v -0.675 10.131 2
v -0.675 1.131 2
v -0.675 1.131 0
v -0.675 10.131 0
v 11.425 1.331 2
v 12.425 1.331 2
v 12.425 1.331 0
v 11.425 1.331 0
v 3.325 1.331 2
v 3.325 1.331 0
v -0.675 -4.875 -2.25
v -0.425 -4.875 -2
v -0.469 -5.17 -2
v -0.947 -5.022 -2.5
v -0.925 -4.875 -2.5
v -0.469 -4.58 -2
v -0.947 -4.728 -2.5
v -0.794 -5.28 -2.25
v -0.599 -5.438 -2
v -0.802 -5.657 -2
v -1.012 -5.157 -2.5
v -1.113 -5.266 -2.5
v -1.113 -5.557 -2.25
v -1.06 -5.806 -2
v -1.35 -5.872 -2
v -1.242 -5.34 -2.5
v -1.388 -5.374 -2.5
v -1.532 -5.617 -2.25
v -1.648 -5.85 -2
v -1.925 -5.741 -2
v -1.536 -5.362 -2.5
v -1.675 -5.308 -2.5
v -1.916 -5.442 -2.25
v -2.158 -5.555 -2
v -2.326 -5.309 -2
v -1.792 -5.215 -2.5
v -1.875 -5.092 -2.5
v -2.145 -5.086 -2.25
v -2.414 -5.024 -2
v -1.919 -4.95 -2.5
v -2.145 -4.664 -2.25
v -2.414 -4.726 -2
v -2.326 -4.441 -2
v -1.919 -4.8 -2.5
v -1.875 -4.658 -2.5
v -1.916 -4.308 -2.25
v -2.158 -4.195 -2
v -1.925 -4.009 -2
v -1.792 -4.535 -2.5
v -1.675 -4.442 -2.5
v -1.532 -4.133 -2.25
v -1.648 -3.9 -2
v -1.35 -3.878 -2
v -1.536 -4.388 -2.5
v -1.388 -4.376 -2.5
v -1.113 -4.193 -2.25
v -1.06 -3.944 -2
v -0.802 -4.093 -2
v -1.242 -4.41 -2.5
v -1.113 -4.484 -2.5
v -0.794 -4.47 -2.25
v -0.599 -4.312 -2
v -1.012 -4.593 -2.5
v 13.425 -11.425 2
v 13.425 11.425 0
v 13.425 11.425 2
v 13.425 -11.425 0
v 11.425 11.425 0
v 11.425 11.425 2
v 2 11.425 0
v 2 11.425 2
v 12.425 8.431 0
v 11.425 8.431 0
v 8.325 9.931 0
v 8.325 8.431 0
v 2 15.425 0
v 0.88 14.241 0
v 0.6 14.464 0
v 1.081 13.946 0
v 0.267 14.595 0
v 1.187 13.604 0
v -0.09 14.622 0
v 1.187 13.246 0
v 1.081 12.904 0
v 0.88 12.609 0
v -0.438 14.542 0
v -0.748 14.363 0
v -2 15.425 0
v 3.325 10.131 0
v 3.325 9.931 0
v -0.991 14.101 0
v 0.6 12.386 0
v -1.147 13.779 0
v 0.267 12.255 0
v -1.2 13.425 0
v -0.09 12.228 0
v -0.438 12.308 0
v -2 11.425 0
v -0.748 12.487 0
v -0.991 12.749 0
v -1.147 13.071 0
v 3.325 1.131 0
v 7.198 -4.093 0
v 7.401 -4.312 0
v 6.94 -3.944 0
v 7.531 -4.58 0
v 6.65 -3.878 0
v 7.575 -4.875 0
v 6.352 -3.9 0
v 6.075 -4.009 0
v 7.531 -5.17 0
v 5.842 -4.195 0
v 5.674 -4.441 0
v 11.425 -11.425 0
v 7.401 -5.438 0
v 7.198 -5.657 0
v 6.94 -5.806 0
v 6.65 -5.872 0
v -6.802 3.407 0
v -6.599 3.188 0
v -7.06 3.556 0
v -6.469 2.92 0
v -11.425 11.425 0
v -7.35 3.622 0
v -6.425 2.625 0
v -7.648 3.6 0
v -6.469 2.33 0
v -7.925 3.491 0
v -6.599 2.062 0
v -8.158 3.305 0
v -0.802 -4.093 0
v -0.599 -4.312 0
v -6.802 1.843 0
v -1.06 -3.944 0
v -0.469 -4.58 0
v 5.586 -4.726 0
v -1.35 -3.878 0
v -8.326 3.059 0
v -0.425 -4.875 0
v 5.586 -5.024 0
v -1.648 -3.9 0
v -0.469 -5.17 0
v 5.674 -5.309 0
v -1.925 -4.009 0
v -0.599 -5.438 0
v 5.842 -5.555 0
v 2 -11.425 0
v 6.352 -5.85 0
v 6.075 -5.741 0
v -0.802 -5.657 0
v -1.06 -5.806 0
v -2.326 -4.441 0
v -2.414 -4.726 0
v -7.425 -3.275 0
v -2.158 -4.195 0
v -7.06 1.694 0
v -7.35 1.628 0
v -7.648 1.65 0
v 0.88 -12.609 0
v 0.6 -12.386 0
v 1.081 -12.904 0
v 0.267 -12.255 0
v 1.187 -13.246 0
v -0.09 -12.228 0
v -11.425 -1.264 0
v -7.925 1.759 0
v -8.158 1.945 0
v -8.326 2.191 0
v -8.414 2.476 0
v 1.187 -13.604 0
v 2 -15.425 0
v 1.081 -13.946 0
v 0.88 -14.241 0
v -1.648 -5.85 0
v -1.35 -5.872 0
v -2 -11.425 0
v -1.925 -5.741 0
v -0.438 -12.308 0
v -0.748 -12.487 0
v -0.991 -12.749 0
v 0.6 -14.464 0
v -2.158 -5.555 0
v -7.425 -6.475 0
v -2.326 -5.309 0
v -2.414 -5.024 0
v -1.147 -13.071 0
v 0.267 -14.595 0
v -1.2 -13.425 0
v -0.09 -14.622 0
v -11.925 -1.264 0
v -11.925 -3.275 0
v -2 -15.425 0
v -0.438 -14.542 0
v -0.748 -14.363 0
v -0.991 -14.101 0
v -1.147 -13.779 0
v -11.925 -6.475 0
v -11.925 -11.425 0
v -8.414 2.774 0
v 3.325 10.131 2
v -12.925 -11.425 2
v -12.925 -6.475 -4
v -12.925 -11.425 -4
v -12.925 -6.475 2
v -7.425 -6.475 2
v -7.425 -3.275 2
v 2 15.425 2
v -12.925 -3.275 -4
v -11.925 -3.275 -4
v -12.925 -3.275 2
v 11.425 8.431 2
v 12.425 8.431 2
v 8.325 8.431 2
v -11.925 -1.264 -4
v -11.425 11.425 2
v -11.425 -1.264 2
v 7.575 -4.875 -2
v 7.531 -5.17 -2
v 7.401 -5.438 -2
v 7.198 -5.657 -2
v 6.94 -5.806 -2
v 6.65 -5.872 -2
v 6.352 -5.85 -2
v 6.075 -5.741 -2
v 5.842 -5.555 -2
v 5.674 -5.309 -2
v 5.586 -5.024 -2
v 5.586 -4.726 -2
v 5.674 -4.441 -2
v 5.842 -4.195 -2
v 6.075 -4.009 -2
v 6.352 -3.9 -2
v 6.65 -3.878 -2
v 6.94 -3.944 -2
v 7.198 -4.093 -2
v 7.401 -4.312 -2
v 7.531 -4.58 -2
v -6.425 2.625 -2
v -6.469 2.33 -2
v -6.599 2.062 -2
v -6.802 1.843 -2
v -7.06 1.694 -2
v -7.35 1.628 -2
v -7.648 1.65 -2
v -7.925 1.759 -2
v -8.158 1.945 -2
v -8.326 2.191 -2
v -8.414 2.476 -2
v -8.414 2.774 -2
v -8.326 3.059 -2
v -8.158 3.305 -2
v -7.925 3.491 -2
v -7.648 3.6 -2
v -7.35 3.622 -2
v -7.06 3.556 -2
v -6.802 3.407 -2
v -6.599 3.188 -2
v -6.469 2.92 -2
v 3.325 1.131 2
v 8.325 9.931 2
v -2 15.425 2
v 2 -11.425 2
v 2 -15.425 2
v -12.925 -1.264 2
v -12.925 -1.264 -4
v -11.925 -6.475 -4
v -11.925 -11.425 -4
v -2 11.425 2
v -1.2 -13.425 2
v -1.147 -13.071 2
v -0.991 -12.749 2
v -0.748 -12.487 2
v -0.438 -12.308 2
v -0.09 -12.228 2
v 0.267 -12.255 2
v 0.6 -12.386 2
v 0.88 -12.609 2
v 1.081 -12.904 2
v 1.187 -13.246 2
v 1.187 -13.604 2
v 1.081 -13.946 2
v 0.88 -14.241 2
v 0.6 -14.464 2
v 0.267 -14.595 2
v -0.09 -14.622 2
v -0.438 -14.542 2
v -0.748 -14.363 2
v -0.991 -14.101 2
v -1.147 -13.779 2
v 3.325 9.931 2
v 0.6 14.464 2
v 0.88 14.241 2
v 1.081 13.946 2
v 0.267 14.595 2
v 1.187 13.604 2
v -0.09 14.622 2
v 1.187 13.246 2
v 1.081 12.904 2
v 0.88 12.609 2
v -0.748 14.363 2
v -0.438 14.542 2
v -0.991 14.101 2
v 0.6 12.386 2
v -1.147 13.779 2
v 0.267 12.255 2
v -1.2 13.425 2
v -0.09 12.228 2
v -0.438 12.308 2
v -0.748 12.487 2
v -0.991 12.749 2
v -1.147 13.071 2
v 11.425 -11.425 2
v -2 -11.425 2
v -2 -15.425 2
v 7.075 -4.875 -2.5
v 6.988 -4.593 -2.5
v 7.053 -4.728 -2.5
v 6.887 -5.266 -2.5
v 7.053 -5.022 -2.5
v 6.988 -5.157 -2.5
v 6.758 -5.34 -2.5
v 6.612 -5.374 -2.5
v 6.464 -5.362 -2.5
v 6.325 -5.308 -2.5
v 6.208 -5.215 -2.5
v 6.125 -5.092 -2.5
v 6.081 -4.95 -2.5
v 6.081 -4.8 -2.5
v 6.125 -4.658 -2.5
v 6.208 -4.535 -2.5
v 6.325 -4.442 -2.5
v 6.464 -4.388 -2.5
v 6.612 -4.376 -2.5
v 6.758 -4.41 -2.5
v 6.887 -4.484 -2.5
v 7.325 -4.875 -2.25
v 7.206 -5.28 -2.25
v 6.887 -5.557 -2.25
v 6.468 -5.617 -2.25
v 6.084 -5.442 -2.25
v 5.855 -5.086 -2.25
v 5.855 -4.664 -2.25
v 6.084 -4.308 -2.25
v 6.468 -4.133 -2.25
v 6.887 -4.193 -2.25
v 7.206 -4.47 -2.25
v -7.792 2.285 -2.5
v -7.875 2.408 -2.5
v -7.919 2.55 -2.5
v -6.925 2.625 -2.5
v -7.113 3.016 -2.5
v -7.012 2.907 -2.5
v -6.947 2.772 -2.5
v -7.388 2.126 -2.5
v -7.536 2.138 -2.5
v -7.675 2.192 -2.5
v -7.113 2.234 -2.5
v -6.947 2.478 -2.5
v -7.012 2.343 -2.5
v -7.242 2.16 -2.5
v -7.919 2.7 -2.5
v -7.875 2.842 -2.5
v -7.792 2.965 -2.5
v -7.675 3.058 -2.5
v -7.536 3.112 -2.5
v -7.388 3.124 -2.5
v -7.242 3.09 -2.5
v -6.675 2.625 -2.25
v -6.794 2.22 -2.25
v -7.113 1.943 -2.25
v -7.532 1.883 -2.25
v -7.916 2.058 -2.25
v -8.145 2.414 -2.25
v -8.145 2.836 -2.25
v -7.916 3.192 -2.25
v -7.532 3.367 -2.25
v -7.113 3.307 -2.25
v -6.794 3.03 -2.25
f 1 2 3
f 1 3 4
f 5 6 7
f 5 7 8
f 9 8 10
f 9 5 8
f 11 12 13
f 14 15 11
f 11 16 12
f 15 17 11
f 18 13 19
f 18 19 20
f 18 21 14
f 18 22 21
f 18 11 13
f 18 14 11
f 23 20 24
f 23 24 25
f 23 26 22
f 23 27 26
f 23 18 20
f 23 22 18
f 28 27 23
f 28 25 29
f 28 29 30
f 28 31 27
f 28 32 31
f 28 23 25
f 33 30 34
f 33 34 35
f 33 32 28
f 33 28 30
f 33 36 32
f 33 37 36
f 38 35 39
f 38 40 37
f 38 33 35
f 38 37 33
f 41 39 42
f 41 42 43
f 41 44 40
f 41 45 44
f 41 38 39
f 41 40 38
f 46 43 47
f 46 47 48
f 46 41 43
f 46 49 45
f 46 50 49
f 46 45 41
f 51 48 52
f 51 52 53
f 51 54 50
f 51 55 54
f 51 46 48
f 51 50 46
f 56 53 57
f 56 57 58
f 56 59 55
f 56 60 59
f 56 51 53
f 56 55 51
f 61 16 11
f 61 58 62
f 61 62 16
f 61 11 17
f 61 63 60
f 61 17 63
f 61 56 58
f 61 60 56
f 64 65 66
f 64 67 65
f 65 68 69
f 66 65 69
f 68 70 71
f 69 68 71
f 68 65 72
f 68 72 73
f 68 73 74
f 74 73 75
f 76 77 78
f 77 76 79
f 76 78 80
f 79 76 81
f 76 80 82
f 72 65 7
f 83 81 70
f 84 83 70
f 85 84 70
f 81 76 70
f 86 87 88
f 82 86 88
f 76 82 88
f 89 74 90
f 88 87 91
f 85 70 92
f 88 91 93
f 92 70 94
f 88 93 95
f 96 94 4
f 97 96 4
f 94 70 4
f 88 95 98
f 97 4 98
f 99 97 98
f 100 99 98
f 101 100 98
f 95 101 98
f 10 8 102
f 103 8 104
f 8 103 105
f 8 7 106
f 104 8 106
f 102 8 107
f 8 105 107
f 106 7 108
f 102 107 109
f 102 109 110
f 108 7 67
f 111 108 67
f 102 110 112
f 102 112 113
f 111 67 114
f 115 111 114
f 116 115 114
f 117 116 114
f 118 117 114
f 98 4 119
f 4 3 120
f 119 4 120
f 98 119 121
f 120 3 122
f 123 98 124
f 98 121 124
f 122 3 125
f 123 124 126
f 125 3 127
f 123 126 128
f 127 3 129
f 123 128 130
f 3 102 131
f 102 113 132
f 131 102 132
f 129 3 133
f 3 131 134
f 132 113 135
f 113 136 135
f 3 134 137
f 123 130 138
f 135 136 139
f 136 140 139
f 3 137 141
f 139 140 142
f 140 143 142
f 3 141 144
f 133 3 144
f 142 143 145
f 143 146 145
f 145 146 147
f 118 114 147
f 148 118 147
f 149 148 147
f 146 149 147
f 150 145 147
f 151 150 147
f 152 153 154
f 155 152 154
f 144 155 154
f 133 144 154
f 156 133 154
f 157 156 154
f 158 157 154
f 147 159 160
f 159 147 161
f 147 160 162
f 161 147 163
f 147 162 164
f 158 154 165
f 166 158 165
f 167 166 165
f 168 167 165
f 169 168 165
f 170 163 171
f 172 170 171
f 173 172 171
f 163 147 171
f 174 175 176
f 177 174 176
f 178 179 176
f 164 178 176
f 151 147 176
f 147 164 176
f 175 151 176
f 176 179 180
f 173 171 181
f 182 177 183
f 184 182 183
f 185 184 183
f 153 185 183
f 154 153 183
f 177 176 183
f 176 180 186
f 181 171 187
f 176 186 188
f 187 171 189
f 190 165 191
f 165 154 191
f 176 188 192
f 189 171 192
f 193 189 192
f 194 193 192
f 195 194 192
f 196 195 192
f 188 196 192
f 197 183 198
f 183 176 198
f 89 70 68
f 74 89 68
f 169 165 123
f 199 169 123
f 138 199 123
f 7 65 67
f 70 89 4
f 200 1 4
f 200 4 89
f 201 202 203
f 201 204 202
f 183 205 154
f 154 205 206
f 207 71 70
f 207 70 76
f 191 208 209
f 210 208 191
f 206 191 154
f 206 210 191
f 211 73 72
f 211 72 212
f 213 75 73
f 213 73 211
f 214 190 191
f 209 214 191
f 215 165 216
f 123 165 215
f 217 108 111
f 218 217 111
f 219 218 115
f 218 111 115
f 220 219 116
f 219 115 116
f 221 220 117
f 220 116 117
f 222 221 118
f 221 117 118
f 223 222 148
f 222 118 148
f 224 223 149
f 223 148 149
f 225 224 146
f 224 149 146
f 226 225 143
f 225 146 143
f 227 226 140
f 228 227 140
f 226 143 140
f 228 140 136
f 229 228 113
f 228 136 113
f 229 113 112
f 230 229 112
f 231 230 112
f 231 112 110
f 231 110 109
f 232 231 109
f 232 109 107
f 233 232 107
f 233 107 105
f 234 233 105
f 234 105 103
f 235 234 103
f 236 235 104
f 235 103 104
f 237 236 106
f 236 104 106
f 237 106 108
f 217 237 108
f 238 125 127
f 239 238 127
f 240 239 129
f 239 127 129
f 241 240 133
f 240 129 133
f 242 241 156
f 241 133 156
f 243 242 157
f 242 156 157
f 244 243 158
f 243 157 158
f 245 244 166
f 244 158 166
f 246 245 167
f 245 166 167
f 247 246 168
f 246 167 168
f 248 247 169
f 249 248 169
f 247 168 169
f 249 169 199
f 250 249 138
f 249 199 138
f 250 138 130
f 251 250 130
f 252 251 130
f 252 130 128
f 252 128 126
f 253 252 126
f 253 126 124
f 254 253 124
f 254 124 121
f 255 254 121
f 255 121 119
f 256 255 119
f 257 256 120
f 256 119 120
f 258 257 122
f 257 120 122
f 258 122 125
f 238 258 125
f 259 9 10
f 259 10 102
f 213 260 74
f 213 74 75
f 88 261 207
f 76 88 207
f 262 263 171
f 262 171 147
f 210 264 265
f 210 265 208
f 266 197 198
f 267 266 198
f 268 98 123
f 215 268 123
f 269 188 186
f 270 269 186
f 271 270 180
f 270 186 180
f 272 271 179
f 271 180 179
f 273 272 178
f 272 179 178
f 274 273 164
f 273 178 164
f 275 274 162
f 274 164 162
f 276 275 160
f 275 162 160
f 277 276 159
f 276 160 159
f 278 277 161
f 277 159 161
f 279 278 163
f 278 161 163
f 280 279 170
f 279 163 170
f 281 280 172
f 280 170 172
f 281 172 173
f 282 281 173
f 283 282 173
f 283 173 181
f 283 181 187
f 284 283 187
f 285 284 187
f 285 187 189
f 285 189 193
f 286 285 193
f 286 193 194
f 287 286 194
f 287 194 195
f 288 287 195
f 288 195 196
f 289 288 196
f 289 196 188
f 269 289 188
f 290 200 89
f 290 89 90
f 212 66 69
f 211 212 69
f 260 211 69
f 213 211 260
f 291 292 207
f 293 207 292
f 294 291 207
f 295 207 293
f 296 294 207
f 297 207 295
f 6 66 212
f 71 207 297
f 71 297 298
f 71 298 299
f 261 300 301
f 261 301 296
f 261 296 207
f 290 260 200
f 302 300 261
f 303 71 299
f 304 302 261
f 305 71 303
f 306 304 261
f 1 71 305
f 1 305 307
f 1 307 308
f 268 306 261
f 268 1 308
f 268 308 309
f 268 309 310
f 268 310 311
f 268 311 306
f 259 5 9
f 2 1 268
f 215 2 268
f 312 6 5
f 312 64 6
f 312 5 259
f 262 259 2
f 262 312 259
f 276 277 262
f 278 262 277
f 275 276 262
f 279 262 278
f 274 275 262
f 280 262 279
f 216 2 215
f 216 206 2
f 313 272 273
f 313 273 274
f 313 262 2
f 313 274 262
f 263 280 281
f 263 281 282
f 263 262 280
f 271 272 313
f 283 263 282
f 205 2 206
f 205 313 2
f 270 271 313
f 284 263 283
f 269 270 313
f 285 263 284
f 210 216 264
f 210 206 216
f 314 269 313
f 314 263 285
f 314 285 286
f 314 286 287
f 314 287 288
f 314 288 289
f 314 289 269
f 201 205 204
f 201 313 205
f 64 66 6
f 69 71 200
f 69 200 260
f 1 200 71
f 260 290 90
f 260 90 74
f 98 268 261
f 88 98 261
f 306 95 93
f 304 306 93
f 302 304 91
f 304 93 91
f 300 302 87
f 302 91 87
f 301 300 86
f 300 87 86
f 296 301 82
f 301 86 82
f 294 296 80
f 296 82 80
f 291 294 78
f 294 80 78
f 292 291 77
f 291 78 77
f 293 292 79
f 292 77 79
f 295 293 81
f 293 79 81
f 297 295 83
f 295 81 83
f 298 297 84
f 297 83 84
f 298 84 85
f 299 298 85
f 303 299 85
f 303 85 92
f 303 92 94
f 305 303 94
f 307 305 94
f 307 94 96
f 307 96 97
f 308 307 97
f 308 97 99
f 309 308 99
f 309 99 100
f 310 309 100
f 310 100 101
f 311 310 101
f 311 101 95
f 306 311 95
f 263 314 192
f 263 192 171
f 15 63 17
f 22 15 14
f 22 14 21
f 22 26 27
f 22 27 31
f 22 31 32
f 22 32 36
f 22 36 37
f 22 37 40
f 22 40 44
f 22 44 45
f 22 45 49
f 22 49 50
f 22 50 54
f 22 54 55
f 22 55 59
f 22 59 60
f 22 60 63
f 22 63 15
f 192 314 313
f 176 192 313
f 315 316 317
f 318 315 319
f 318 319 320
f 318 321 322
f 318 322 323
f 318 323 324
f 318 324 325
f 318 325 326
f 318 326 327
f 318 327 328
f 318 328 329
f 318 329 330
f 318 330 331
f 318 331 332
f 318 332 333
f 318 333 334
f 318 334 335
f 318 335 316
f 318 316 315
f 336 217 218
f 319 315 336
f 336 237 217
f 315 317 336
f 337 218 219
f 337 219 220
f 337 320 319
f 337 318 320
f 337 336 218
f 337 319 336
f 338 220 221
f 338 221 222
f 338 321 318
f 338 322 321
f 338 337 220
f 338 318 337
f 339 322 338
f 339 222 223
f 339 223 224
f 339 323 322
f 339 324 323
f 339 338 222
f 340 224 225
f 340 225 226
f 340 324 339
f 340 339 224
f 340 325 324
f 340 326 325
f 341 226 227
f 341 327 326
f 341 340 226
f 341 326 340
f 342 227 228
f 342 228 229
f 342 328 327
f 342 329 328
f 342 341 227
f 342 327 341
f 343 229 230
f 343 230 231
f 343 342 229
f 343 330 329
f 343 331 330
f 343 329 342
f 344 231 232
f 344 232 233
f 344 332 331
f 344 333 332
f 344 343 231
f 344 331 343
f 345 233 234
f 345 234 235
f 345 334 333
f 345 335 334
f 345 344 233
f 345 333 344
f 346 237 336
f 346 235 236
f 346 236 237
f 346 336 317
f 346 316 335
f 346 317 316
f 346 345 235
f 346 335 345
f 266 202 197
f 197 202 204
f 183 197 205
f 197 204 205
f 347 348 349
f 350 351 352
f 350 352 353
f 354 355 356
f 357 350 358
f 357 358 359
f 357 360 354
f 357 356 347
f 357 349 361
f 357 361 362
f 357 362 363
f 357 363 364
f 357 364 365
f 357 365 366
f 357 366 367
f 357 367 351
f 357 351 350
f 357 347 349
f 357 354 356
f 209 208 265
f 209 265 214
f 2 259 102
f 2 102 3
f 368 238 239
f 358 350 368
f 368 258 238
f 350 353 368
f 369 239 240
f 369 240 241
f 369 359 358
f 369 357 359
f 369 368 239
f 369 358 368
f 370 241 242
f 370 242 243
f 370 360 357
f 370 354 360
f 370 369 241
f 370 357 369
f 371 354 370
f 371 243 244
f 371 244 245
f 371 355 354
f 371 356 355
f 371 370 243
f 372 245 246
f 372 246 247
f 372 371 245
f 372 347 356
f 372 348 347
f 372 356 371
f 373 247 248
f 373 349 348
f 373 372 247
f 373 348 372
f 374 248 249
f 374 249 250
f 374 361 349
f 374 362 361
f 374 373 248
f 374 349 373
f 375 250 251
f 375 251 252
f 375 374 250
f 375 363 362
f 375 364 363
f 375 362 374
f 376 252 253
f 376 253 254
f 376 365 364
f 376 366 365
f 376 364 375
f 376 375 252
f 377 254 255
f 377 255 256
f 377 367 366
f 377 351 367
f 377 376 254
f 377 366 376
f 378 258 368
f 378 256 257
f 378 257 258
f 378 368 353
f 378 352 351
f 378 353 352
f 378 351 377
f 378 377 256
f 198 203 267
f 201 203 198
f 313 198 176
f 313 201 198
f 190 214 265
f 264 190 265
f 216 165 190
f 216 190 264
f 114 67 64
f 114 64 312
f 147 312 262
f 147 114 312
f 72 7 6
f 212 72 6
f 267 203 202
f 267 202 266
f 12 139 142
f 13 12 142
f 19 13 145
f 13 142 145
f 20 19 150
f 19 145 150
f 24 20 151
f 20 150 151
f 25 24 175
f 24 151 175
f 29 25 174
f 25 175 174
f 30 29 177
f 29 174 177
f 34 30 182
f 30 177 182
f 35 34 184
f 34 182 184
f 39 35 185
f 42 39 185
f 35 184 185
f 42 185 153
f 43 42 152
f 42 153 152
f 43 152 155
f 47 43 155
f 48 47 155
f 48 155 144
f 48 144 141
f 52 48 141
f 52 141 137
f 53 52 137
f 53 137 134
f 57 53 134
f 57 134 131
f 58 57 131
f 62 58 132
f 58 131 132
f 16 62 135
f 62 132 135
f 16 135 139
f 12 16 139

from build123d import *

# Parameters (mm, degrees)
SKETCH2_W            = 22.85
SKETCH2_H            = 22.85
BOSS_EXTRUDE1_DEPTH  = 2
SKETCH3_W            = 4
SKETCH3_H            = 4
BOSS_EXTRUDE2_DEPTH  = 2
M2_CLEARANCE_HOLE1_D = 2.4
CUT_EXTRUDE3_REACH   = 21.299
CUT_EXTRUDE4_REACH   = 21.299
SKETCH8_W            = 4
SKETCH8_H            = 3.2
SKETCH10_W           = 4.95
SKETCH10_H           = 2
SKETCH10_W_2         = 2.01114152
BOSS_EXTRUDE3_DEPTH  = 1.5
SKETCH11_W           = 1
SKETCH11_H           = 4.95
SKETCH11_H_2         = 2.01114152
BOSS_EXTRUDE4_DEPTH  = 4
SKETCH12_W           = 2.993624713
SKETCH12_H           = 2
SKETCH12_W_2         = 12.756375287
BOSS_EXTRUDE5_DEPTH  = 2
SKETCH13_W           = 1
SKETCH13_H           = 2
BOSS_EXTRUDE6_DEPTH  = 7.1
SKETCH15_R           = 1
BOSS_EXTRUDE7_DEPTH  = 2.5
CHAMFER1_SIZE        = 0.5


with BuildPart() as part:
    # Sketch2 → Boss-Extrude1 (new body)
    with BuildSketch(Plane(origin=(0, 0, 0), x_dir=(0, 1, 0), z_dir=(0, 0, 1))):
        Rectangle(SKETCH2_W, SKETCH2_H)
    extrude(amount=BOSS_EXTRUDE1_DEPTH)

    # Sketch3 → Boss-Extrude2 (add)
    with BuildSketch(Plane.XY.offset(2)):
        with Locations((0, 13.425)):
            Rectangle(SKETCH3_W, SKETCH3_H)
        with Locations((0, -13.425)):
            Rectangle(SKETCH3_W, SKETCH3_H)
    extrude(amount=-BOSS_EXTRUDE2_DEPTH)

    # M2 Clearance Hole1 (through all)
    with Locations(Plane.XY.offset(2)):
        with Locations((0, 13.425), (0, -13.425)):
            Hole(M2_CLEARANCE_HOLE1_D / 2)

    # Sketch7 → Cut-Extrude3 (cut, up to next)
    with BuildSketch(Plane.XY.offset(2), mode=Mode.PRIVATE) as cut_extrude3_sk1:
        Polygon((11.425, 8.431375287), (11.425, 1.331375287), (3.325, 1.331375287), (3.325, 1.131375287), (-0.675, 1.131375287), (-0.675, 10.131375287), (3.325, 10.131375287), (3.325, 9.931375287), (8.325, 9.931375287), (8.325, 8.431375287), align=None)
    cut_extrude3_tool1 = extrude(cut_extrude3_sk1.sketch, amount=-CUT_EXTRUDE3_REACH, mode=Mode.PRIVATE) & part.part
    add(cut_extrude3_tool1.solids().sort_by_distance((5.10369, 5.467951, 2))[0], mode=Mode.SUBTRACT)

    # Sketch8 → Cut-Extrude4 (cut, up to next)
    with BuildSketch(Plane.XY.offset(2), mode=Mode.PRIVATE) as cut_extrude4_sk1:
        with Locations((-9.425, -4.875)):
            Rectangle(SKETCH8_W, SKETCH8_H)
    cut_extrude4_tool1 = extrude(cut_extrude4_sk1.sketch, amount=-CUT_EXTRUDE4_REACH, mode=Mode.PRIVATE) & part.part
    add(cut_extrude4_tool1.solids().sort_by_distance((-9.425, -4.875, 2))[0], mode=Mode.SUBTRACT)

    # Sketch10 → Boss-Extrude3 (add)
    with BuildSketch(Plane(origin=(-11.425, 0, 0), x_dir=(0, -1, 0), z_dir=(-1, 0, 0))):
        with Locations((8.95, 1)):
            Rectangle(SKETCH10_W, SKETCH10_H)
        with Locations((2.26942924, 1)):
            Rectangle(SKETCH10_W_2, SKETCH10_H)
    extrude(amount=BOSS_EXTRUDE3_DEPTH)

    # Sketch11 → Boss-Extrude4 (add)
    with BuildSketch(Plane(origin=(0, 0, 0), x_dir=(1, 0, 0), z_dir=(0, 0, -1))):
        with Locations((-12.425, 8.95)):
            Rectangle(SKETCH11_W, SKETCH11_H)
        with Locations((-12.425, 2.26942924)):
            Rectangle(SKETCH11_W, SKETCH11_H_2)
    extrude(amount=BOSS_EXTRUDE4_DEPTH)

    # Sketch12 → Boss-Extrude5 (add)
    with BuildSketch(Plane.YZ.offset(11.425)):
        with Locations((9.928187643, 1)):
            Rectangle(SKETCH12_W, SKETCH12_H)
        with Locations((-5.046812357, 1)):
            Rectangle(SKETCH12_W_2, SKETCH12_H)
    extrude(amount=BOSS_EXTRUDE5_DEPTH)

    # Sketch13 → Boss-Extrude6 (add)
    with BuildSketch(Plane(origin=(0, 1.331375287, 0), x_dir=(-1, 0, 0), z_dir=(0, 1, 0))):
        with Locations((-12.925, 1)):
            Rectangle(SKETCH13_W, SKETCH13_H)
    extrude(amount=BOSS_EXTRUDE6_DEPTH)

    # Sketch15 → Boss-Extrude7 (add)
    with BuildSketch(Plane(origin=(0, 0, 0), x_dir=(1, 0, 0), z_dir=(0, 0, -1))):
        with Locations((-1.425, 4.875)):
            Circle(SKETCH15_R)
        with Locations((6.575, 4.875)):
            Circle(SKETCH15_R)
        with Locations((-7.425, -2.625)):
            Circle(SKETCH15_R)
    extrude(amount=BOSS_EXTRUDE7_DEPTH)

    # Chamfer1
    chamfer1_edges = [part.edges().sort_by_distance(p)[0] for p in [
        (-8.425, 2.625, -2.5),
        (5.575, -4.875, -2.5),
        (-2.425, -4.875, -2.5),
    ]]
    chamfer(chamfer1_edges, length=CHAMFER1_SIZE)


solid = part.part
